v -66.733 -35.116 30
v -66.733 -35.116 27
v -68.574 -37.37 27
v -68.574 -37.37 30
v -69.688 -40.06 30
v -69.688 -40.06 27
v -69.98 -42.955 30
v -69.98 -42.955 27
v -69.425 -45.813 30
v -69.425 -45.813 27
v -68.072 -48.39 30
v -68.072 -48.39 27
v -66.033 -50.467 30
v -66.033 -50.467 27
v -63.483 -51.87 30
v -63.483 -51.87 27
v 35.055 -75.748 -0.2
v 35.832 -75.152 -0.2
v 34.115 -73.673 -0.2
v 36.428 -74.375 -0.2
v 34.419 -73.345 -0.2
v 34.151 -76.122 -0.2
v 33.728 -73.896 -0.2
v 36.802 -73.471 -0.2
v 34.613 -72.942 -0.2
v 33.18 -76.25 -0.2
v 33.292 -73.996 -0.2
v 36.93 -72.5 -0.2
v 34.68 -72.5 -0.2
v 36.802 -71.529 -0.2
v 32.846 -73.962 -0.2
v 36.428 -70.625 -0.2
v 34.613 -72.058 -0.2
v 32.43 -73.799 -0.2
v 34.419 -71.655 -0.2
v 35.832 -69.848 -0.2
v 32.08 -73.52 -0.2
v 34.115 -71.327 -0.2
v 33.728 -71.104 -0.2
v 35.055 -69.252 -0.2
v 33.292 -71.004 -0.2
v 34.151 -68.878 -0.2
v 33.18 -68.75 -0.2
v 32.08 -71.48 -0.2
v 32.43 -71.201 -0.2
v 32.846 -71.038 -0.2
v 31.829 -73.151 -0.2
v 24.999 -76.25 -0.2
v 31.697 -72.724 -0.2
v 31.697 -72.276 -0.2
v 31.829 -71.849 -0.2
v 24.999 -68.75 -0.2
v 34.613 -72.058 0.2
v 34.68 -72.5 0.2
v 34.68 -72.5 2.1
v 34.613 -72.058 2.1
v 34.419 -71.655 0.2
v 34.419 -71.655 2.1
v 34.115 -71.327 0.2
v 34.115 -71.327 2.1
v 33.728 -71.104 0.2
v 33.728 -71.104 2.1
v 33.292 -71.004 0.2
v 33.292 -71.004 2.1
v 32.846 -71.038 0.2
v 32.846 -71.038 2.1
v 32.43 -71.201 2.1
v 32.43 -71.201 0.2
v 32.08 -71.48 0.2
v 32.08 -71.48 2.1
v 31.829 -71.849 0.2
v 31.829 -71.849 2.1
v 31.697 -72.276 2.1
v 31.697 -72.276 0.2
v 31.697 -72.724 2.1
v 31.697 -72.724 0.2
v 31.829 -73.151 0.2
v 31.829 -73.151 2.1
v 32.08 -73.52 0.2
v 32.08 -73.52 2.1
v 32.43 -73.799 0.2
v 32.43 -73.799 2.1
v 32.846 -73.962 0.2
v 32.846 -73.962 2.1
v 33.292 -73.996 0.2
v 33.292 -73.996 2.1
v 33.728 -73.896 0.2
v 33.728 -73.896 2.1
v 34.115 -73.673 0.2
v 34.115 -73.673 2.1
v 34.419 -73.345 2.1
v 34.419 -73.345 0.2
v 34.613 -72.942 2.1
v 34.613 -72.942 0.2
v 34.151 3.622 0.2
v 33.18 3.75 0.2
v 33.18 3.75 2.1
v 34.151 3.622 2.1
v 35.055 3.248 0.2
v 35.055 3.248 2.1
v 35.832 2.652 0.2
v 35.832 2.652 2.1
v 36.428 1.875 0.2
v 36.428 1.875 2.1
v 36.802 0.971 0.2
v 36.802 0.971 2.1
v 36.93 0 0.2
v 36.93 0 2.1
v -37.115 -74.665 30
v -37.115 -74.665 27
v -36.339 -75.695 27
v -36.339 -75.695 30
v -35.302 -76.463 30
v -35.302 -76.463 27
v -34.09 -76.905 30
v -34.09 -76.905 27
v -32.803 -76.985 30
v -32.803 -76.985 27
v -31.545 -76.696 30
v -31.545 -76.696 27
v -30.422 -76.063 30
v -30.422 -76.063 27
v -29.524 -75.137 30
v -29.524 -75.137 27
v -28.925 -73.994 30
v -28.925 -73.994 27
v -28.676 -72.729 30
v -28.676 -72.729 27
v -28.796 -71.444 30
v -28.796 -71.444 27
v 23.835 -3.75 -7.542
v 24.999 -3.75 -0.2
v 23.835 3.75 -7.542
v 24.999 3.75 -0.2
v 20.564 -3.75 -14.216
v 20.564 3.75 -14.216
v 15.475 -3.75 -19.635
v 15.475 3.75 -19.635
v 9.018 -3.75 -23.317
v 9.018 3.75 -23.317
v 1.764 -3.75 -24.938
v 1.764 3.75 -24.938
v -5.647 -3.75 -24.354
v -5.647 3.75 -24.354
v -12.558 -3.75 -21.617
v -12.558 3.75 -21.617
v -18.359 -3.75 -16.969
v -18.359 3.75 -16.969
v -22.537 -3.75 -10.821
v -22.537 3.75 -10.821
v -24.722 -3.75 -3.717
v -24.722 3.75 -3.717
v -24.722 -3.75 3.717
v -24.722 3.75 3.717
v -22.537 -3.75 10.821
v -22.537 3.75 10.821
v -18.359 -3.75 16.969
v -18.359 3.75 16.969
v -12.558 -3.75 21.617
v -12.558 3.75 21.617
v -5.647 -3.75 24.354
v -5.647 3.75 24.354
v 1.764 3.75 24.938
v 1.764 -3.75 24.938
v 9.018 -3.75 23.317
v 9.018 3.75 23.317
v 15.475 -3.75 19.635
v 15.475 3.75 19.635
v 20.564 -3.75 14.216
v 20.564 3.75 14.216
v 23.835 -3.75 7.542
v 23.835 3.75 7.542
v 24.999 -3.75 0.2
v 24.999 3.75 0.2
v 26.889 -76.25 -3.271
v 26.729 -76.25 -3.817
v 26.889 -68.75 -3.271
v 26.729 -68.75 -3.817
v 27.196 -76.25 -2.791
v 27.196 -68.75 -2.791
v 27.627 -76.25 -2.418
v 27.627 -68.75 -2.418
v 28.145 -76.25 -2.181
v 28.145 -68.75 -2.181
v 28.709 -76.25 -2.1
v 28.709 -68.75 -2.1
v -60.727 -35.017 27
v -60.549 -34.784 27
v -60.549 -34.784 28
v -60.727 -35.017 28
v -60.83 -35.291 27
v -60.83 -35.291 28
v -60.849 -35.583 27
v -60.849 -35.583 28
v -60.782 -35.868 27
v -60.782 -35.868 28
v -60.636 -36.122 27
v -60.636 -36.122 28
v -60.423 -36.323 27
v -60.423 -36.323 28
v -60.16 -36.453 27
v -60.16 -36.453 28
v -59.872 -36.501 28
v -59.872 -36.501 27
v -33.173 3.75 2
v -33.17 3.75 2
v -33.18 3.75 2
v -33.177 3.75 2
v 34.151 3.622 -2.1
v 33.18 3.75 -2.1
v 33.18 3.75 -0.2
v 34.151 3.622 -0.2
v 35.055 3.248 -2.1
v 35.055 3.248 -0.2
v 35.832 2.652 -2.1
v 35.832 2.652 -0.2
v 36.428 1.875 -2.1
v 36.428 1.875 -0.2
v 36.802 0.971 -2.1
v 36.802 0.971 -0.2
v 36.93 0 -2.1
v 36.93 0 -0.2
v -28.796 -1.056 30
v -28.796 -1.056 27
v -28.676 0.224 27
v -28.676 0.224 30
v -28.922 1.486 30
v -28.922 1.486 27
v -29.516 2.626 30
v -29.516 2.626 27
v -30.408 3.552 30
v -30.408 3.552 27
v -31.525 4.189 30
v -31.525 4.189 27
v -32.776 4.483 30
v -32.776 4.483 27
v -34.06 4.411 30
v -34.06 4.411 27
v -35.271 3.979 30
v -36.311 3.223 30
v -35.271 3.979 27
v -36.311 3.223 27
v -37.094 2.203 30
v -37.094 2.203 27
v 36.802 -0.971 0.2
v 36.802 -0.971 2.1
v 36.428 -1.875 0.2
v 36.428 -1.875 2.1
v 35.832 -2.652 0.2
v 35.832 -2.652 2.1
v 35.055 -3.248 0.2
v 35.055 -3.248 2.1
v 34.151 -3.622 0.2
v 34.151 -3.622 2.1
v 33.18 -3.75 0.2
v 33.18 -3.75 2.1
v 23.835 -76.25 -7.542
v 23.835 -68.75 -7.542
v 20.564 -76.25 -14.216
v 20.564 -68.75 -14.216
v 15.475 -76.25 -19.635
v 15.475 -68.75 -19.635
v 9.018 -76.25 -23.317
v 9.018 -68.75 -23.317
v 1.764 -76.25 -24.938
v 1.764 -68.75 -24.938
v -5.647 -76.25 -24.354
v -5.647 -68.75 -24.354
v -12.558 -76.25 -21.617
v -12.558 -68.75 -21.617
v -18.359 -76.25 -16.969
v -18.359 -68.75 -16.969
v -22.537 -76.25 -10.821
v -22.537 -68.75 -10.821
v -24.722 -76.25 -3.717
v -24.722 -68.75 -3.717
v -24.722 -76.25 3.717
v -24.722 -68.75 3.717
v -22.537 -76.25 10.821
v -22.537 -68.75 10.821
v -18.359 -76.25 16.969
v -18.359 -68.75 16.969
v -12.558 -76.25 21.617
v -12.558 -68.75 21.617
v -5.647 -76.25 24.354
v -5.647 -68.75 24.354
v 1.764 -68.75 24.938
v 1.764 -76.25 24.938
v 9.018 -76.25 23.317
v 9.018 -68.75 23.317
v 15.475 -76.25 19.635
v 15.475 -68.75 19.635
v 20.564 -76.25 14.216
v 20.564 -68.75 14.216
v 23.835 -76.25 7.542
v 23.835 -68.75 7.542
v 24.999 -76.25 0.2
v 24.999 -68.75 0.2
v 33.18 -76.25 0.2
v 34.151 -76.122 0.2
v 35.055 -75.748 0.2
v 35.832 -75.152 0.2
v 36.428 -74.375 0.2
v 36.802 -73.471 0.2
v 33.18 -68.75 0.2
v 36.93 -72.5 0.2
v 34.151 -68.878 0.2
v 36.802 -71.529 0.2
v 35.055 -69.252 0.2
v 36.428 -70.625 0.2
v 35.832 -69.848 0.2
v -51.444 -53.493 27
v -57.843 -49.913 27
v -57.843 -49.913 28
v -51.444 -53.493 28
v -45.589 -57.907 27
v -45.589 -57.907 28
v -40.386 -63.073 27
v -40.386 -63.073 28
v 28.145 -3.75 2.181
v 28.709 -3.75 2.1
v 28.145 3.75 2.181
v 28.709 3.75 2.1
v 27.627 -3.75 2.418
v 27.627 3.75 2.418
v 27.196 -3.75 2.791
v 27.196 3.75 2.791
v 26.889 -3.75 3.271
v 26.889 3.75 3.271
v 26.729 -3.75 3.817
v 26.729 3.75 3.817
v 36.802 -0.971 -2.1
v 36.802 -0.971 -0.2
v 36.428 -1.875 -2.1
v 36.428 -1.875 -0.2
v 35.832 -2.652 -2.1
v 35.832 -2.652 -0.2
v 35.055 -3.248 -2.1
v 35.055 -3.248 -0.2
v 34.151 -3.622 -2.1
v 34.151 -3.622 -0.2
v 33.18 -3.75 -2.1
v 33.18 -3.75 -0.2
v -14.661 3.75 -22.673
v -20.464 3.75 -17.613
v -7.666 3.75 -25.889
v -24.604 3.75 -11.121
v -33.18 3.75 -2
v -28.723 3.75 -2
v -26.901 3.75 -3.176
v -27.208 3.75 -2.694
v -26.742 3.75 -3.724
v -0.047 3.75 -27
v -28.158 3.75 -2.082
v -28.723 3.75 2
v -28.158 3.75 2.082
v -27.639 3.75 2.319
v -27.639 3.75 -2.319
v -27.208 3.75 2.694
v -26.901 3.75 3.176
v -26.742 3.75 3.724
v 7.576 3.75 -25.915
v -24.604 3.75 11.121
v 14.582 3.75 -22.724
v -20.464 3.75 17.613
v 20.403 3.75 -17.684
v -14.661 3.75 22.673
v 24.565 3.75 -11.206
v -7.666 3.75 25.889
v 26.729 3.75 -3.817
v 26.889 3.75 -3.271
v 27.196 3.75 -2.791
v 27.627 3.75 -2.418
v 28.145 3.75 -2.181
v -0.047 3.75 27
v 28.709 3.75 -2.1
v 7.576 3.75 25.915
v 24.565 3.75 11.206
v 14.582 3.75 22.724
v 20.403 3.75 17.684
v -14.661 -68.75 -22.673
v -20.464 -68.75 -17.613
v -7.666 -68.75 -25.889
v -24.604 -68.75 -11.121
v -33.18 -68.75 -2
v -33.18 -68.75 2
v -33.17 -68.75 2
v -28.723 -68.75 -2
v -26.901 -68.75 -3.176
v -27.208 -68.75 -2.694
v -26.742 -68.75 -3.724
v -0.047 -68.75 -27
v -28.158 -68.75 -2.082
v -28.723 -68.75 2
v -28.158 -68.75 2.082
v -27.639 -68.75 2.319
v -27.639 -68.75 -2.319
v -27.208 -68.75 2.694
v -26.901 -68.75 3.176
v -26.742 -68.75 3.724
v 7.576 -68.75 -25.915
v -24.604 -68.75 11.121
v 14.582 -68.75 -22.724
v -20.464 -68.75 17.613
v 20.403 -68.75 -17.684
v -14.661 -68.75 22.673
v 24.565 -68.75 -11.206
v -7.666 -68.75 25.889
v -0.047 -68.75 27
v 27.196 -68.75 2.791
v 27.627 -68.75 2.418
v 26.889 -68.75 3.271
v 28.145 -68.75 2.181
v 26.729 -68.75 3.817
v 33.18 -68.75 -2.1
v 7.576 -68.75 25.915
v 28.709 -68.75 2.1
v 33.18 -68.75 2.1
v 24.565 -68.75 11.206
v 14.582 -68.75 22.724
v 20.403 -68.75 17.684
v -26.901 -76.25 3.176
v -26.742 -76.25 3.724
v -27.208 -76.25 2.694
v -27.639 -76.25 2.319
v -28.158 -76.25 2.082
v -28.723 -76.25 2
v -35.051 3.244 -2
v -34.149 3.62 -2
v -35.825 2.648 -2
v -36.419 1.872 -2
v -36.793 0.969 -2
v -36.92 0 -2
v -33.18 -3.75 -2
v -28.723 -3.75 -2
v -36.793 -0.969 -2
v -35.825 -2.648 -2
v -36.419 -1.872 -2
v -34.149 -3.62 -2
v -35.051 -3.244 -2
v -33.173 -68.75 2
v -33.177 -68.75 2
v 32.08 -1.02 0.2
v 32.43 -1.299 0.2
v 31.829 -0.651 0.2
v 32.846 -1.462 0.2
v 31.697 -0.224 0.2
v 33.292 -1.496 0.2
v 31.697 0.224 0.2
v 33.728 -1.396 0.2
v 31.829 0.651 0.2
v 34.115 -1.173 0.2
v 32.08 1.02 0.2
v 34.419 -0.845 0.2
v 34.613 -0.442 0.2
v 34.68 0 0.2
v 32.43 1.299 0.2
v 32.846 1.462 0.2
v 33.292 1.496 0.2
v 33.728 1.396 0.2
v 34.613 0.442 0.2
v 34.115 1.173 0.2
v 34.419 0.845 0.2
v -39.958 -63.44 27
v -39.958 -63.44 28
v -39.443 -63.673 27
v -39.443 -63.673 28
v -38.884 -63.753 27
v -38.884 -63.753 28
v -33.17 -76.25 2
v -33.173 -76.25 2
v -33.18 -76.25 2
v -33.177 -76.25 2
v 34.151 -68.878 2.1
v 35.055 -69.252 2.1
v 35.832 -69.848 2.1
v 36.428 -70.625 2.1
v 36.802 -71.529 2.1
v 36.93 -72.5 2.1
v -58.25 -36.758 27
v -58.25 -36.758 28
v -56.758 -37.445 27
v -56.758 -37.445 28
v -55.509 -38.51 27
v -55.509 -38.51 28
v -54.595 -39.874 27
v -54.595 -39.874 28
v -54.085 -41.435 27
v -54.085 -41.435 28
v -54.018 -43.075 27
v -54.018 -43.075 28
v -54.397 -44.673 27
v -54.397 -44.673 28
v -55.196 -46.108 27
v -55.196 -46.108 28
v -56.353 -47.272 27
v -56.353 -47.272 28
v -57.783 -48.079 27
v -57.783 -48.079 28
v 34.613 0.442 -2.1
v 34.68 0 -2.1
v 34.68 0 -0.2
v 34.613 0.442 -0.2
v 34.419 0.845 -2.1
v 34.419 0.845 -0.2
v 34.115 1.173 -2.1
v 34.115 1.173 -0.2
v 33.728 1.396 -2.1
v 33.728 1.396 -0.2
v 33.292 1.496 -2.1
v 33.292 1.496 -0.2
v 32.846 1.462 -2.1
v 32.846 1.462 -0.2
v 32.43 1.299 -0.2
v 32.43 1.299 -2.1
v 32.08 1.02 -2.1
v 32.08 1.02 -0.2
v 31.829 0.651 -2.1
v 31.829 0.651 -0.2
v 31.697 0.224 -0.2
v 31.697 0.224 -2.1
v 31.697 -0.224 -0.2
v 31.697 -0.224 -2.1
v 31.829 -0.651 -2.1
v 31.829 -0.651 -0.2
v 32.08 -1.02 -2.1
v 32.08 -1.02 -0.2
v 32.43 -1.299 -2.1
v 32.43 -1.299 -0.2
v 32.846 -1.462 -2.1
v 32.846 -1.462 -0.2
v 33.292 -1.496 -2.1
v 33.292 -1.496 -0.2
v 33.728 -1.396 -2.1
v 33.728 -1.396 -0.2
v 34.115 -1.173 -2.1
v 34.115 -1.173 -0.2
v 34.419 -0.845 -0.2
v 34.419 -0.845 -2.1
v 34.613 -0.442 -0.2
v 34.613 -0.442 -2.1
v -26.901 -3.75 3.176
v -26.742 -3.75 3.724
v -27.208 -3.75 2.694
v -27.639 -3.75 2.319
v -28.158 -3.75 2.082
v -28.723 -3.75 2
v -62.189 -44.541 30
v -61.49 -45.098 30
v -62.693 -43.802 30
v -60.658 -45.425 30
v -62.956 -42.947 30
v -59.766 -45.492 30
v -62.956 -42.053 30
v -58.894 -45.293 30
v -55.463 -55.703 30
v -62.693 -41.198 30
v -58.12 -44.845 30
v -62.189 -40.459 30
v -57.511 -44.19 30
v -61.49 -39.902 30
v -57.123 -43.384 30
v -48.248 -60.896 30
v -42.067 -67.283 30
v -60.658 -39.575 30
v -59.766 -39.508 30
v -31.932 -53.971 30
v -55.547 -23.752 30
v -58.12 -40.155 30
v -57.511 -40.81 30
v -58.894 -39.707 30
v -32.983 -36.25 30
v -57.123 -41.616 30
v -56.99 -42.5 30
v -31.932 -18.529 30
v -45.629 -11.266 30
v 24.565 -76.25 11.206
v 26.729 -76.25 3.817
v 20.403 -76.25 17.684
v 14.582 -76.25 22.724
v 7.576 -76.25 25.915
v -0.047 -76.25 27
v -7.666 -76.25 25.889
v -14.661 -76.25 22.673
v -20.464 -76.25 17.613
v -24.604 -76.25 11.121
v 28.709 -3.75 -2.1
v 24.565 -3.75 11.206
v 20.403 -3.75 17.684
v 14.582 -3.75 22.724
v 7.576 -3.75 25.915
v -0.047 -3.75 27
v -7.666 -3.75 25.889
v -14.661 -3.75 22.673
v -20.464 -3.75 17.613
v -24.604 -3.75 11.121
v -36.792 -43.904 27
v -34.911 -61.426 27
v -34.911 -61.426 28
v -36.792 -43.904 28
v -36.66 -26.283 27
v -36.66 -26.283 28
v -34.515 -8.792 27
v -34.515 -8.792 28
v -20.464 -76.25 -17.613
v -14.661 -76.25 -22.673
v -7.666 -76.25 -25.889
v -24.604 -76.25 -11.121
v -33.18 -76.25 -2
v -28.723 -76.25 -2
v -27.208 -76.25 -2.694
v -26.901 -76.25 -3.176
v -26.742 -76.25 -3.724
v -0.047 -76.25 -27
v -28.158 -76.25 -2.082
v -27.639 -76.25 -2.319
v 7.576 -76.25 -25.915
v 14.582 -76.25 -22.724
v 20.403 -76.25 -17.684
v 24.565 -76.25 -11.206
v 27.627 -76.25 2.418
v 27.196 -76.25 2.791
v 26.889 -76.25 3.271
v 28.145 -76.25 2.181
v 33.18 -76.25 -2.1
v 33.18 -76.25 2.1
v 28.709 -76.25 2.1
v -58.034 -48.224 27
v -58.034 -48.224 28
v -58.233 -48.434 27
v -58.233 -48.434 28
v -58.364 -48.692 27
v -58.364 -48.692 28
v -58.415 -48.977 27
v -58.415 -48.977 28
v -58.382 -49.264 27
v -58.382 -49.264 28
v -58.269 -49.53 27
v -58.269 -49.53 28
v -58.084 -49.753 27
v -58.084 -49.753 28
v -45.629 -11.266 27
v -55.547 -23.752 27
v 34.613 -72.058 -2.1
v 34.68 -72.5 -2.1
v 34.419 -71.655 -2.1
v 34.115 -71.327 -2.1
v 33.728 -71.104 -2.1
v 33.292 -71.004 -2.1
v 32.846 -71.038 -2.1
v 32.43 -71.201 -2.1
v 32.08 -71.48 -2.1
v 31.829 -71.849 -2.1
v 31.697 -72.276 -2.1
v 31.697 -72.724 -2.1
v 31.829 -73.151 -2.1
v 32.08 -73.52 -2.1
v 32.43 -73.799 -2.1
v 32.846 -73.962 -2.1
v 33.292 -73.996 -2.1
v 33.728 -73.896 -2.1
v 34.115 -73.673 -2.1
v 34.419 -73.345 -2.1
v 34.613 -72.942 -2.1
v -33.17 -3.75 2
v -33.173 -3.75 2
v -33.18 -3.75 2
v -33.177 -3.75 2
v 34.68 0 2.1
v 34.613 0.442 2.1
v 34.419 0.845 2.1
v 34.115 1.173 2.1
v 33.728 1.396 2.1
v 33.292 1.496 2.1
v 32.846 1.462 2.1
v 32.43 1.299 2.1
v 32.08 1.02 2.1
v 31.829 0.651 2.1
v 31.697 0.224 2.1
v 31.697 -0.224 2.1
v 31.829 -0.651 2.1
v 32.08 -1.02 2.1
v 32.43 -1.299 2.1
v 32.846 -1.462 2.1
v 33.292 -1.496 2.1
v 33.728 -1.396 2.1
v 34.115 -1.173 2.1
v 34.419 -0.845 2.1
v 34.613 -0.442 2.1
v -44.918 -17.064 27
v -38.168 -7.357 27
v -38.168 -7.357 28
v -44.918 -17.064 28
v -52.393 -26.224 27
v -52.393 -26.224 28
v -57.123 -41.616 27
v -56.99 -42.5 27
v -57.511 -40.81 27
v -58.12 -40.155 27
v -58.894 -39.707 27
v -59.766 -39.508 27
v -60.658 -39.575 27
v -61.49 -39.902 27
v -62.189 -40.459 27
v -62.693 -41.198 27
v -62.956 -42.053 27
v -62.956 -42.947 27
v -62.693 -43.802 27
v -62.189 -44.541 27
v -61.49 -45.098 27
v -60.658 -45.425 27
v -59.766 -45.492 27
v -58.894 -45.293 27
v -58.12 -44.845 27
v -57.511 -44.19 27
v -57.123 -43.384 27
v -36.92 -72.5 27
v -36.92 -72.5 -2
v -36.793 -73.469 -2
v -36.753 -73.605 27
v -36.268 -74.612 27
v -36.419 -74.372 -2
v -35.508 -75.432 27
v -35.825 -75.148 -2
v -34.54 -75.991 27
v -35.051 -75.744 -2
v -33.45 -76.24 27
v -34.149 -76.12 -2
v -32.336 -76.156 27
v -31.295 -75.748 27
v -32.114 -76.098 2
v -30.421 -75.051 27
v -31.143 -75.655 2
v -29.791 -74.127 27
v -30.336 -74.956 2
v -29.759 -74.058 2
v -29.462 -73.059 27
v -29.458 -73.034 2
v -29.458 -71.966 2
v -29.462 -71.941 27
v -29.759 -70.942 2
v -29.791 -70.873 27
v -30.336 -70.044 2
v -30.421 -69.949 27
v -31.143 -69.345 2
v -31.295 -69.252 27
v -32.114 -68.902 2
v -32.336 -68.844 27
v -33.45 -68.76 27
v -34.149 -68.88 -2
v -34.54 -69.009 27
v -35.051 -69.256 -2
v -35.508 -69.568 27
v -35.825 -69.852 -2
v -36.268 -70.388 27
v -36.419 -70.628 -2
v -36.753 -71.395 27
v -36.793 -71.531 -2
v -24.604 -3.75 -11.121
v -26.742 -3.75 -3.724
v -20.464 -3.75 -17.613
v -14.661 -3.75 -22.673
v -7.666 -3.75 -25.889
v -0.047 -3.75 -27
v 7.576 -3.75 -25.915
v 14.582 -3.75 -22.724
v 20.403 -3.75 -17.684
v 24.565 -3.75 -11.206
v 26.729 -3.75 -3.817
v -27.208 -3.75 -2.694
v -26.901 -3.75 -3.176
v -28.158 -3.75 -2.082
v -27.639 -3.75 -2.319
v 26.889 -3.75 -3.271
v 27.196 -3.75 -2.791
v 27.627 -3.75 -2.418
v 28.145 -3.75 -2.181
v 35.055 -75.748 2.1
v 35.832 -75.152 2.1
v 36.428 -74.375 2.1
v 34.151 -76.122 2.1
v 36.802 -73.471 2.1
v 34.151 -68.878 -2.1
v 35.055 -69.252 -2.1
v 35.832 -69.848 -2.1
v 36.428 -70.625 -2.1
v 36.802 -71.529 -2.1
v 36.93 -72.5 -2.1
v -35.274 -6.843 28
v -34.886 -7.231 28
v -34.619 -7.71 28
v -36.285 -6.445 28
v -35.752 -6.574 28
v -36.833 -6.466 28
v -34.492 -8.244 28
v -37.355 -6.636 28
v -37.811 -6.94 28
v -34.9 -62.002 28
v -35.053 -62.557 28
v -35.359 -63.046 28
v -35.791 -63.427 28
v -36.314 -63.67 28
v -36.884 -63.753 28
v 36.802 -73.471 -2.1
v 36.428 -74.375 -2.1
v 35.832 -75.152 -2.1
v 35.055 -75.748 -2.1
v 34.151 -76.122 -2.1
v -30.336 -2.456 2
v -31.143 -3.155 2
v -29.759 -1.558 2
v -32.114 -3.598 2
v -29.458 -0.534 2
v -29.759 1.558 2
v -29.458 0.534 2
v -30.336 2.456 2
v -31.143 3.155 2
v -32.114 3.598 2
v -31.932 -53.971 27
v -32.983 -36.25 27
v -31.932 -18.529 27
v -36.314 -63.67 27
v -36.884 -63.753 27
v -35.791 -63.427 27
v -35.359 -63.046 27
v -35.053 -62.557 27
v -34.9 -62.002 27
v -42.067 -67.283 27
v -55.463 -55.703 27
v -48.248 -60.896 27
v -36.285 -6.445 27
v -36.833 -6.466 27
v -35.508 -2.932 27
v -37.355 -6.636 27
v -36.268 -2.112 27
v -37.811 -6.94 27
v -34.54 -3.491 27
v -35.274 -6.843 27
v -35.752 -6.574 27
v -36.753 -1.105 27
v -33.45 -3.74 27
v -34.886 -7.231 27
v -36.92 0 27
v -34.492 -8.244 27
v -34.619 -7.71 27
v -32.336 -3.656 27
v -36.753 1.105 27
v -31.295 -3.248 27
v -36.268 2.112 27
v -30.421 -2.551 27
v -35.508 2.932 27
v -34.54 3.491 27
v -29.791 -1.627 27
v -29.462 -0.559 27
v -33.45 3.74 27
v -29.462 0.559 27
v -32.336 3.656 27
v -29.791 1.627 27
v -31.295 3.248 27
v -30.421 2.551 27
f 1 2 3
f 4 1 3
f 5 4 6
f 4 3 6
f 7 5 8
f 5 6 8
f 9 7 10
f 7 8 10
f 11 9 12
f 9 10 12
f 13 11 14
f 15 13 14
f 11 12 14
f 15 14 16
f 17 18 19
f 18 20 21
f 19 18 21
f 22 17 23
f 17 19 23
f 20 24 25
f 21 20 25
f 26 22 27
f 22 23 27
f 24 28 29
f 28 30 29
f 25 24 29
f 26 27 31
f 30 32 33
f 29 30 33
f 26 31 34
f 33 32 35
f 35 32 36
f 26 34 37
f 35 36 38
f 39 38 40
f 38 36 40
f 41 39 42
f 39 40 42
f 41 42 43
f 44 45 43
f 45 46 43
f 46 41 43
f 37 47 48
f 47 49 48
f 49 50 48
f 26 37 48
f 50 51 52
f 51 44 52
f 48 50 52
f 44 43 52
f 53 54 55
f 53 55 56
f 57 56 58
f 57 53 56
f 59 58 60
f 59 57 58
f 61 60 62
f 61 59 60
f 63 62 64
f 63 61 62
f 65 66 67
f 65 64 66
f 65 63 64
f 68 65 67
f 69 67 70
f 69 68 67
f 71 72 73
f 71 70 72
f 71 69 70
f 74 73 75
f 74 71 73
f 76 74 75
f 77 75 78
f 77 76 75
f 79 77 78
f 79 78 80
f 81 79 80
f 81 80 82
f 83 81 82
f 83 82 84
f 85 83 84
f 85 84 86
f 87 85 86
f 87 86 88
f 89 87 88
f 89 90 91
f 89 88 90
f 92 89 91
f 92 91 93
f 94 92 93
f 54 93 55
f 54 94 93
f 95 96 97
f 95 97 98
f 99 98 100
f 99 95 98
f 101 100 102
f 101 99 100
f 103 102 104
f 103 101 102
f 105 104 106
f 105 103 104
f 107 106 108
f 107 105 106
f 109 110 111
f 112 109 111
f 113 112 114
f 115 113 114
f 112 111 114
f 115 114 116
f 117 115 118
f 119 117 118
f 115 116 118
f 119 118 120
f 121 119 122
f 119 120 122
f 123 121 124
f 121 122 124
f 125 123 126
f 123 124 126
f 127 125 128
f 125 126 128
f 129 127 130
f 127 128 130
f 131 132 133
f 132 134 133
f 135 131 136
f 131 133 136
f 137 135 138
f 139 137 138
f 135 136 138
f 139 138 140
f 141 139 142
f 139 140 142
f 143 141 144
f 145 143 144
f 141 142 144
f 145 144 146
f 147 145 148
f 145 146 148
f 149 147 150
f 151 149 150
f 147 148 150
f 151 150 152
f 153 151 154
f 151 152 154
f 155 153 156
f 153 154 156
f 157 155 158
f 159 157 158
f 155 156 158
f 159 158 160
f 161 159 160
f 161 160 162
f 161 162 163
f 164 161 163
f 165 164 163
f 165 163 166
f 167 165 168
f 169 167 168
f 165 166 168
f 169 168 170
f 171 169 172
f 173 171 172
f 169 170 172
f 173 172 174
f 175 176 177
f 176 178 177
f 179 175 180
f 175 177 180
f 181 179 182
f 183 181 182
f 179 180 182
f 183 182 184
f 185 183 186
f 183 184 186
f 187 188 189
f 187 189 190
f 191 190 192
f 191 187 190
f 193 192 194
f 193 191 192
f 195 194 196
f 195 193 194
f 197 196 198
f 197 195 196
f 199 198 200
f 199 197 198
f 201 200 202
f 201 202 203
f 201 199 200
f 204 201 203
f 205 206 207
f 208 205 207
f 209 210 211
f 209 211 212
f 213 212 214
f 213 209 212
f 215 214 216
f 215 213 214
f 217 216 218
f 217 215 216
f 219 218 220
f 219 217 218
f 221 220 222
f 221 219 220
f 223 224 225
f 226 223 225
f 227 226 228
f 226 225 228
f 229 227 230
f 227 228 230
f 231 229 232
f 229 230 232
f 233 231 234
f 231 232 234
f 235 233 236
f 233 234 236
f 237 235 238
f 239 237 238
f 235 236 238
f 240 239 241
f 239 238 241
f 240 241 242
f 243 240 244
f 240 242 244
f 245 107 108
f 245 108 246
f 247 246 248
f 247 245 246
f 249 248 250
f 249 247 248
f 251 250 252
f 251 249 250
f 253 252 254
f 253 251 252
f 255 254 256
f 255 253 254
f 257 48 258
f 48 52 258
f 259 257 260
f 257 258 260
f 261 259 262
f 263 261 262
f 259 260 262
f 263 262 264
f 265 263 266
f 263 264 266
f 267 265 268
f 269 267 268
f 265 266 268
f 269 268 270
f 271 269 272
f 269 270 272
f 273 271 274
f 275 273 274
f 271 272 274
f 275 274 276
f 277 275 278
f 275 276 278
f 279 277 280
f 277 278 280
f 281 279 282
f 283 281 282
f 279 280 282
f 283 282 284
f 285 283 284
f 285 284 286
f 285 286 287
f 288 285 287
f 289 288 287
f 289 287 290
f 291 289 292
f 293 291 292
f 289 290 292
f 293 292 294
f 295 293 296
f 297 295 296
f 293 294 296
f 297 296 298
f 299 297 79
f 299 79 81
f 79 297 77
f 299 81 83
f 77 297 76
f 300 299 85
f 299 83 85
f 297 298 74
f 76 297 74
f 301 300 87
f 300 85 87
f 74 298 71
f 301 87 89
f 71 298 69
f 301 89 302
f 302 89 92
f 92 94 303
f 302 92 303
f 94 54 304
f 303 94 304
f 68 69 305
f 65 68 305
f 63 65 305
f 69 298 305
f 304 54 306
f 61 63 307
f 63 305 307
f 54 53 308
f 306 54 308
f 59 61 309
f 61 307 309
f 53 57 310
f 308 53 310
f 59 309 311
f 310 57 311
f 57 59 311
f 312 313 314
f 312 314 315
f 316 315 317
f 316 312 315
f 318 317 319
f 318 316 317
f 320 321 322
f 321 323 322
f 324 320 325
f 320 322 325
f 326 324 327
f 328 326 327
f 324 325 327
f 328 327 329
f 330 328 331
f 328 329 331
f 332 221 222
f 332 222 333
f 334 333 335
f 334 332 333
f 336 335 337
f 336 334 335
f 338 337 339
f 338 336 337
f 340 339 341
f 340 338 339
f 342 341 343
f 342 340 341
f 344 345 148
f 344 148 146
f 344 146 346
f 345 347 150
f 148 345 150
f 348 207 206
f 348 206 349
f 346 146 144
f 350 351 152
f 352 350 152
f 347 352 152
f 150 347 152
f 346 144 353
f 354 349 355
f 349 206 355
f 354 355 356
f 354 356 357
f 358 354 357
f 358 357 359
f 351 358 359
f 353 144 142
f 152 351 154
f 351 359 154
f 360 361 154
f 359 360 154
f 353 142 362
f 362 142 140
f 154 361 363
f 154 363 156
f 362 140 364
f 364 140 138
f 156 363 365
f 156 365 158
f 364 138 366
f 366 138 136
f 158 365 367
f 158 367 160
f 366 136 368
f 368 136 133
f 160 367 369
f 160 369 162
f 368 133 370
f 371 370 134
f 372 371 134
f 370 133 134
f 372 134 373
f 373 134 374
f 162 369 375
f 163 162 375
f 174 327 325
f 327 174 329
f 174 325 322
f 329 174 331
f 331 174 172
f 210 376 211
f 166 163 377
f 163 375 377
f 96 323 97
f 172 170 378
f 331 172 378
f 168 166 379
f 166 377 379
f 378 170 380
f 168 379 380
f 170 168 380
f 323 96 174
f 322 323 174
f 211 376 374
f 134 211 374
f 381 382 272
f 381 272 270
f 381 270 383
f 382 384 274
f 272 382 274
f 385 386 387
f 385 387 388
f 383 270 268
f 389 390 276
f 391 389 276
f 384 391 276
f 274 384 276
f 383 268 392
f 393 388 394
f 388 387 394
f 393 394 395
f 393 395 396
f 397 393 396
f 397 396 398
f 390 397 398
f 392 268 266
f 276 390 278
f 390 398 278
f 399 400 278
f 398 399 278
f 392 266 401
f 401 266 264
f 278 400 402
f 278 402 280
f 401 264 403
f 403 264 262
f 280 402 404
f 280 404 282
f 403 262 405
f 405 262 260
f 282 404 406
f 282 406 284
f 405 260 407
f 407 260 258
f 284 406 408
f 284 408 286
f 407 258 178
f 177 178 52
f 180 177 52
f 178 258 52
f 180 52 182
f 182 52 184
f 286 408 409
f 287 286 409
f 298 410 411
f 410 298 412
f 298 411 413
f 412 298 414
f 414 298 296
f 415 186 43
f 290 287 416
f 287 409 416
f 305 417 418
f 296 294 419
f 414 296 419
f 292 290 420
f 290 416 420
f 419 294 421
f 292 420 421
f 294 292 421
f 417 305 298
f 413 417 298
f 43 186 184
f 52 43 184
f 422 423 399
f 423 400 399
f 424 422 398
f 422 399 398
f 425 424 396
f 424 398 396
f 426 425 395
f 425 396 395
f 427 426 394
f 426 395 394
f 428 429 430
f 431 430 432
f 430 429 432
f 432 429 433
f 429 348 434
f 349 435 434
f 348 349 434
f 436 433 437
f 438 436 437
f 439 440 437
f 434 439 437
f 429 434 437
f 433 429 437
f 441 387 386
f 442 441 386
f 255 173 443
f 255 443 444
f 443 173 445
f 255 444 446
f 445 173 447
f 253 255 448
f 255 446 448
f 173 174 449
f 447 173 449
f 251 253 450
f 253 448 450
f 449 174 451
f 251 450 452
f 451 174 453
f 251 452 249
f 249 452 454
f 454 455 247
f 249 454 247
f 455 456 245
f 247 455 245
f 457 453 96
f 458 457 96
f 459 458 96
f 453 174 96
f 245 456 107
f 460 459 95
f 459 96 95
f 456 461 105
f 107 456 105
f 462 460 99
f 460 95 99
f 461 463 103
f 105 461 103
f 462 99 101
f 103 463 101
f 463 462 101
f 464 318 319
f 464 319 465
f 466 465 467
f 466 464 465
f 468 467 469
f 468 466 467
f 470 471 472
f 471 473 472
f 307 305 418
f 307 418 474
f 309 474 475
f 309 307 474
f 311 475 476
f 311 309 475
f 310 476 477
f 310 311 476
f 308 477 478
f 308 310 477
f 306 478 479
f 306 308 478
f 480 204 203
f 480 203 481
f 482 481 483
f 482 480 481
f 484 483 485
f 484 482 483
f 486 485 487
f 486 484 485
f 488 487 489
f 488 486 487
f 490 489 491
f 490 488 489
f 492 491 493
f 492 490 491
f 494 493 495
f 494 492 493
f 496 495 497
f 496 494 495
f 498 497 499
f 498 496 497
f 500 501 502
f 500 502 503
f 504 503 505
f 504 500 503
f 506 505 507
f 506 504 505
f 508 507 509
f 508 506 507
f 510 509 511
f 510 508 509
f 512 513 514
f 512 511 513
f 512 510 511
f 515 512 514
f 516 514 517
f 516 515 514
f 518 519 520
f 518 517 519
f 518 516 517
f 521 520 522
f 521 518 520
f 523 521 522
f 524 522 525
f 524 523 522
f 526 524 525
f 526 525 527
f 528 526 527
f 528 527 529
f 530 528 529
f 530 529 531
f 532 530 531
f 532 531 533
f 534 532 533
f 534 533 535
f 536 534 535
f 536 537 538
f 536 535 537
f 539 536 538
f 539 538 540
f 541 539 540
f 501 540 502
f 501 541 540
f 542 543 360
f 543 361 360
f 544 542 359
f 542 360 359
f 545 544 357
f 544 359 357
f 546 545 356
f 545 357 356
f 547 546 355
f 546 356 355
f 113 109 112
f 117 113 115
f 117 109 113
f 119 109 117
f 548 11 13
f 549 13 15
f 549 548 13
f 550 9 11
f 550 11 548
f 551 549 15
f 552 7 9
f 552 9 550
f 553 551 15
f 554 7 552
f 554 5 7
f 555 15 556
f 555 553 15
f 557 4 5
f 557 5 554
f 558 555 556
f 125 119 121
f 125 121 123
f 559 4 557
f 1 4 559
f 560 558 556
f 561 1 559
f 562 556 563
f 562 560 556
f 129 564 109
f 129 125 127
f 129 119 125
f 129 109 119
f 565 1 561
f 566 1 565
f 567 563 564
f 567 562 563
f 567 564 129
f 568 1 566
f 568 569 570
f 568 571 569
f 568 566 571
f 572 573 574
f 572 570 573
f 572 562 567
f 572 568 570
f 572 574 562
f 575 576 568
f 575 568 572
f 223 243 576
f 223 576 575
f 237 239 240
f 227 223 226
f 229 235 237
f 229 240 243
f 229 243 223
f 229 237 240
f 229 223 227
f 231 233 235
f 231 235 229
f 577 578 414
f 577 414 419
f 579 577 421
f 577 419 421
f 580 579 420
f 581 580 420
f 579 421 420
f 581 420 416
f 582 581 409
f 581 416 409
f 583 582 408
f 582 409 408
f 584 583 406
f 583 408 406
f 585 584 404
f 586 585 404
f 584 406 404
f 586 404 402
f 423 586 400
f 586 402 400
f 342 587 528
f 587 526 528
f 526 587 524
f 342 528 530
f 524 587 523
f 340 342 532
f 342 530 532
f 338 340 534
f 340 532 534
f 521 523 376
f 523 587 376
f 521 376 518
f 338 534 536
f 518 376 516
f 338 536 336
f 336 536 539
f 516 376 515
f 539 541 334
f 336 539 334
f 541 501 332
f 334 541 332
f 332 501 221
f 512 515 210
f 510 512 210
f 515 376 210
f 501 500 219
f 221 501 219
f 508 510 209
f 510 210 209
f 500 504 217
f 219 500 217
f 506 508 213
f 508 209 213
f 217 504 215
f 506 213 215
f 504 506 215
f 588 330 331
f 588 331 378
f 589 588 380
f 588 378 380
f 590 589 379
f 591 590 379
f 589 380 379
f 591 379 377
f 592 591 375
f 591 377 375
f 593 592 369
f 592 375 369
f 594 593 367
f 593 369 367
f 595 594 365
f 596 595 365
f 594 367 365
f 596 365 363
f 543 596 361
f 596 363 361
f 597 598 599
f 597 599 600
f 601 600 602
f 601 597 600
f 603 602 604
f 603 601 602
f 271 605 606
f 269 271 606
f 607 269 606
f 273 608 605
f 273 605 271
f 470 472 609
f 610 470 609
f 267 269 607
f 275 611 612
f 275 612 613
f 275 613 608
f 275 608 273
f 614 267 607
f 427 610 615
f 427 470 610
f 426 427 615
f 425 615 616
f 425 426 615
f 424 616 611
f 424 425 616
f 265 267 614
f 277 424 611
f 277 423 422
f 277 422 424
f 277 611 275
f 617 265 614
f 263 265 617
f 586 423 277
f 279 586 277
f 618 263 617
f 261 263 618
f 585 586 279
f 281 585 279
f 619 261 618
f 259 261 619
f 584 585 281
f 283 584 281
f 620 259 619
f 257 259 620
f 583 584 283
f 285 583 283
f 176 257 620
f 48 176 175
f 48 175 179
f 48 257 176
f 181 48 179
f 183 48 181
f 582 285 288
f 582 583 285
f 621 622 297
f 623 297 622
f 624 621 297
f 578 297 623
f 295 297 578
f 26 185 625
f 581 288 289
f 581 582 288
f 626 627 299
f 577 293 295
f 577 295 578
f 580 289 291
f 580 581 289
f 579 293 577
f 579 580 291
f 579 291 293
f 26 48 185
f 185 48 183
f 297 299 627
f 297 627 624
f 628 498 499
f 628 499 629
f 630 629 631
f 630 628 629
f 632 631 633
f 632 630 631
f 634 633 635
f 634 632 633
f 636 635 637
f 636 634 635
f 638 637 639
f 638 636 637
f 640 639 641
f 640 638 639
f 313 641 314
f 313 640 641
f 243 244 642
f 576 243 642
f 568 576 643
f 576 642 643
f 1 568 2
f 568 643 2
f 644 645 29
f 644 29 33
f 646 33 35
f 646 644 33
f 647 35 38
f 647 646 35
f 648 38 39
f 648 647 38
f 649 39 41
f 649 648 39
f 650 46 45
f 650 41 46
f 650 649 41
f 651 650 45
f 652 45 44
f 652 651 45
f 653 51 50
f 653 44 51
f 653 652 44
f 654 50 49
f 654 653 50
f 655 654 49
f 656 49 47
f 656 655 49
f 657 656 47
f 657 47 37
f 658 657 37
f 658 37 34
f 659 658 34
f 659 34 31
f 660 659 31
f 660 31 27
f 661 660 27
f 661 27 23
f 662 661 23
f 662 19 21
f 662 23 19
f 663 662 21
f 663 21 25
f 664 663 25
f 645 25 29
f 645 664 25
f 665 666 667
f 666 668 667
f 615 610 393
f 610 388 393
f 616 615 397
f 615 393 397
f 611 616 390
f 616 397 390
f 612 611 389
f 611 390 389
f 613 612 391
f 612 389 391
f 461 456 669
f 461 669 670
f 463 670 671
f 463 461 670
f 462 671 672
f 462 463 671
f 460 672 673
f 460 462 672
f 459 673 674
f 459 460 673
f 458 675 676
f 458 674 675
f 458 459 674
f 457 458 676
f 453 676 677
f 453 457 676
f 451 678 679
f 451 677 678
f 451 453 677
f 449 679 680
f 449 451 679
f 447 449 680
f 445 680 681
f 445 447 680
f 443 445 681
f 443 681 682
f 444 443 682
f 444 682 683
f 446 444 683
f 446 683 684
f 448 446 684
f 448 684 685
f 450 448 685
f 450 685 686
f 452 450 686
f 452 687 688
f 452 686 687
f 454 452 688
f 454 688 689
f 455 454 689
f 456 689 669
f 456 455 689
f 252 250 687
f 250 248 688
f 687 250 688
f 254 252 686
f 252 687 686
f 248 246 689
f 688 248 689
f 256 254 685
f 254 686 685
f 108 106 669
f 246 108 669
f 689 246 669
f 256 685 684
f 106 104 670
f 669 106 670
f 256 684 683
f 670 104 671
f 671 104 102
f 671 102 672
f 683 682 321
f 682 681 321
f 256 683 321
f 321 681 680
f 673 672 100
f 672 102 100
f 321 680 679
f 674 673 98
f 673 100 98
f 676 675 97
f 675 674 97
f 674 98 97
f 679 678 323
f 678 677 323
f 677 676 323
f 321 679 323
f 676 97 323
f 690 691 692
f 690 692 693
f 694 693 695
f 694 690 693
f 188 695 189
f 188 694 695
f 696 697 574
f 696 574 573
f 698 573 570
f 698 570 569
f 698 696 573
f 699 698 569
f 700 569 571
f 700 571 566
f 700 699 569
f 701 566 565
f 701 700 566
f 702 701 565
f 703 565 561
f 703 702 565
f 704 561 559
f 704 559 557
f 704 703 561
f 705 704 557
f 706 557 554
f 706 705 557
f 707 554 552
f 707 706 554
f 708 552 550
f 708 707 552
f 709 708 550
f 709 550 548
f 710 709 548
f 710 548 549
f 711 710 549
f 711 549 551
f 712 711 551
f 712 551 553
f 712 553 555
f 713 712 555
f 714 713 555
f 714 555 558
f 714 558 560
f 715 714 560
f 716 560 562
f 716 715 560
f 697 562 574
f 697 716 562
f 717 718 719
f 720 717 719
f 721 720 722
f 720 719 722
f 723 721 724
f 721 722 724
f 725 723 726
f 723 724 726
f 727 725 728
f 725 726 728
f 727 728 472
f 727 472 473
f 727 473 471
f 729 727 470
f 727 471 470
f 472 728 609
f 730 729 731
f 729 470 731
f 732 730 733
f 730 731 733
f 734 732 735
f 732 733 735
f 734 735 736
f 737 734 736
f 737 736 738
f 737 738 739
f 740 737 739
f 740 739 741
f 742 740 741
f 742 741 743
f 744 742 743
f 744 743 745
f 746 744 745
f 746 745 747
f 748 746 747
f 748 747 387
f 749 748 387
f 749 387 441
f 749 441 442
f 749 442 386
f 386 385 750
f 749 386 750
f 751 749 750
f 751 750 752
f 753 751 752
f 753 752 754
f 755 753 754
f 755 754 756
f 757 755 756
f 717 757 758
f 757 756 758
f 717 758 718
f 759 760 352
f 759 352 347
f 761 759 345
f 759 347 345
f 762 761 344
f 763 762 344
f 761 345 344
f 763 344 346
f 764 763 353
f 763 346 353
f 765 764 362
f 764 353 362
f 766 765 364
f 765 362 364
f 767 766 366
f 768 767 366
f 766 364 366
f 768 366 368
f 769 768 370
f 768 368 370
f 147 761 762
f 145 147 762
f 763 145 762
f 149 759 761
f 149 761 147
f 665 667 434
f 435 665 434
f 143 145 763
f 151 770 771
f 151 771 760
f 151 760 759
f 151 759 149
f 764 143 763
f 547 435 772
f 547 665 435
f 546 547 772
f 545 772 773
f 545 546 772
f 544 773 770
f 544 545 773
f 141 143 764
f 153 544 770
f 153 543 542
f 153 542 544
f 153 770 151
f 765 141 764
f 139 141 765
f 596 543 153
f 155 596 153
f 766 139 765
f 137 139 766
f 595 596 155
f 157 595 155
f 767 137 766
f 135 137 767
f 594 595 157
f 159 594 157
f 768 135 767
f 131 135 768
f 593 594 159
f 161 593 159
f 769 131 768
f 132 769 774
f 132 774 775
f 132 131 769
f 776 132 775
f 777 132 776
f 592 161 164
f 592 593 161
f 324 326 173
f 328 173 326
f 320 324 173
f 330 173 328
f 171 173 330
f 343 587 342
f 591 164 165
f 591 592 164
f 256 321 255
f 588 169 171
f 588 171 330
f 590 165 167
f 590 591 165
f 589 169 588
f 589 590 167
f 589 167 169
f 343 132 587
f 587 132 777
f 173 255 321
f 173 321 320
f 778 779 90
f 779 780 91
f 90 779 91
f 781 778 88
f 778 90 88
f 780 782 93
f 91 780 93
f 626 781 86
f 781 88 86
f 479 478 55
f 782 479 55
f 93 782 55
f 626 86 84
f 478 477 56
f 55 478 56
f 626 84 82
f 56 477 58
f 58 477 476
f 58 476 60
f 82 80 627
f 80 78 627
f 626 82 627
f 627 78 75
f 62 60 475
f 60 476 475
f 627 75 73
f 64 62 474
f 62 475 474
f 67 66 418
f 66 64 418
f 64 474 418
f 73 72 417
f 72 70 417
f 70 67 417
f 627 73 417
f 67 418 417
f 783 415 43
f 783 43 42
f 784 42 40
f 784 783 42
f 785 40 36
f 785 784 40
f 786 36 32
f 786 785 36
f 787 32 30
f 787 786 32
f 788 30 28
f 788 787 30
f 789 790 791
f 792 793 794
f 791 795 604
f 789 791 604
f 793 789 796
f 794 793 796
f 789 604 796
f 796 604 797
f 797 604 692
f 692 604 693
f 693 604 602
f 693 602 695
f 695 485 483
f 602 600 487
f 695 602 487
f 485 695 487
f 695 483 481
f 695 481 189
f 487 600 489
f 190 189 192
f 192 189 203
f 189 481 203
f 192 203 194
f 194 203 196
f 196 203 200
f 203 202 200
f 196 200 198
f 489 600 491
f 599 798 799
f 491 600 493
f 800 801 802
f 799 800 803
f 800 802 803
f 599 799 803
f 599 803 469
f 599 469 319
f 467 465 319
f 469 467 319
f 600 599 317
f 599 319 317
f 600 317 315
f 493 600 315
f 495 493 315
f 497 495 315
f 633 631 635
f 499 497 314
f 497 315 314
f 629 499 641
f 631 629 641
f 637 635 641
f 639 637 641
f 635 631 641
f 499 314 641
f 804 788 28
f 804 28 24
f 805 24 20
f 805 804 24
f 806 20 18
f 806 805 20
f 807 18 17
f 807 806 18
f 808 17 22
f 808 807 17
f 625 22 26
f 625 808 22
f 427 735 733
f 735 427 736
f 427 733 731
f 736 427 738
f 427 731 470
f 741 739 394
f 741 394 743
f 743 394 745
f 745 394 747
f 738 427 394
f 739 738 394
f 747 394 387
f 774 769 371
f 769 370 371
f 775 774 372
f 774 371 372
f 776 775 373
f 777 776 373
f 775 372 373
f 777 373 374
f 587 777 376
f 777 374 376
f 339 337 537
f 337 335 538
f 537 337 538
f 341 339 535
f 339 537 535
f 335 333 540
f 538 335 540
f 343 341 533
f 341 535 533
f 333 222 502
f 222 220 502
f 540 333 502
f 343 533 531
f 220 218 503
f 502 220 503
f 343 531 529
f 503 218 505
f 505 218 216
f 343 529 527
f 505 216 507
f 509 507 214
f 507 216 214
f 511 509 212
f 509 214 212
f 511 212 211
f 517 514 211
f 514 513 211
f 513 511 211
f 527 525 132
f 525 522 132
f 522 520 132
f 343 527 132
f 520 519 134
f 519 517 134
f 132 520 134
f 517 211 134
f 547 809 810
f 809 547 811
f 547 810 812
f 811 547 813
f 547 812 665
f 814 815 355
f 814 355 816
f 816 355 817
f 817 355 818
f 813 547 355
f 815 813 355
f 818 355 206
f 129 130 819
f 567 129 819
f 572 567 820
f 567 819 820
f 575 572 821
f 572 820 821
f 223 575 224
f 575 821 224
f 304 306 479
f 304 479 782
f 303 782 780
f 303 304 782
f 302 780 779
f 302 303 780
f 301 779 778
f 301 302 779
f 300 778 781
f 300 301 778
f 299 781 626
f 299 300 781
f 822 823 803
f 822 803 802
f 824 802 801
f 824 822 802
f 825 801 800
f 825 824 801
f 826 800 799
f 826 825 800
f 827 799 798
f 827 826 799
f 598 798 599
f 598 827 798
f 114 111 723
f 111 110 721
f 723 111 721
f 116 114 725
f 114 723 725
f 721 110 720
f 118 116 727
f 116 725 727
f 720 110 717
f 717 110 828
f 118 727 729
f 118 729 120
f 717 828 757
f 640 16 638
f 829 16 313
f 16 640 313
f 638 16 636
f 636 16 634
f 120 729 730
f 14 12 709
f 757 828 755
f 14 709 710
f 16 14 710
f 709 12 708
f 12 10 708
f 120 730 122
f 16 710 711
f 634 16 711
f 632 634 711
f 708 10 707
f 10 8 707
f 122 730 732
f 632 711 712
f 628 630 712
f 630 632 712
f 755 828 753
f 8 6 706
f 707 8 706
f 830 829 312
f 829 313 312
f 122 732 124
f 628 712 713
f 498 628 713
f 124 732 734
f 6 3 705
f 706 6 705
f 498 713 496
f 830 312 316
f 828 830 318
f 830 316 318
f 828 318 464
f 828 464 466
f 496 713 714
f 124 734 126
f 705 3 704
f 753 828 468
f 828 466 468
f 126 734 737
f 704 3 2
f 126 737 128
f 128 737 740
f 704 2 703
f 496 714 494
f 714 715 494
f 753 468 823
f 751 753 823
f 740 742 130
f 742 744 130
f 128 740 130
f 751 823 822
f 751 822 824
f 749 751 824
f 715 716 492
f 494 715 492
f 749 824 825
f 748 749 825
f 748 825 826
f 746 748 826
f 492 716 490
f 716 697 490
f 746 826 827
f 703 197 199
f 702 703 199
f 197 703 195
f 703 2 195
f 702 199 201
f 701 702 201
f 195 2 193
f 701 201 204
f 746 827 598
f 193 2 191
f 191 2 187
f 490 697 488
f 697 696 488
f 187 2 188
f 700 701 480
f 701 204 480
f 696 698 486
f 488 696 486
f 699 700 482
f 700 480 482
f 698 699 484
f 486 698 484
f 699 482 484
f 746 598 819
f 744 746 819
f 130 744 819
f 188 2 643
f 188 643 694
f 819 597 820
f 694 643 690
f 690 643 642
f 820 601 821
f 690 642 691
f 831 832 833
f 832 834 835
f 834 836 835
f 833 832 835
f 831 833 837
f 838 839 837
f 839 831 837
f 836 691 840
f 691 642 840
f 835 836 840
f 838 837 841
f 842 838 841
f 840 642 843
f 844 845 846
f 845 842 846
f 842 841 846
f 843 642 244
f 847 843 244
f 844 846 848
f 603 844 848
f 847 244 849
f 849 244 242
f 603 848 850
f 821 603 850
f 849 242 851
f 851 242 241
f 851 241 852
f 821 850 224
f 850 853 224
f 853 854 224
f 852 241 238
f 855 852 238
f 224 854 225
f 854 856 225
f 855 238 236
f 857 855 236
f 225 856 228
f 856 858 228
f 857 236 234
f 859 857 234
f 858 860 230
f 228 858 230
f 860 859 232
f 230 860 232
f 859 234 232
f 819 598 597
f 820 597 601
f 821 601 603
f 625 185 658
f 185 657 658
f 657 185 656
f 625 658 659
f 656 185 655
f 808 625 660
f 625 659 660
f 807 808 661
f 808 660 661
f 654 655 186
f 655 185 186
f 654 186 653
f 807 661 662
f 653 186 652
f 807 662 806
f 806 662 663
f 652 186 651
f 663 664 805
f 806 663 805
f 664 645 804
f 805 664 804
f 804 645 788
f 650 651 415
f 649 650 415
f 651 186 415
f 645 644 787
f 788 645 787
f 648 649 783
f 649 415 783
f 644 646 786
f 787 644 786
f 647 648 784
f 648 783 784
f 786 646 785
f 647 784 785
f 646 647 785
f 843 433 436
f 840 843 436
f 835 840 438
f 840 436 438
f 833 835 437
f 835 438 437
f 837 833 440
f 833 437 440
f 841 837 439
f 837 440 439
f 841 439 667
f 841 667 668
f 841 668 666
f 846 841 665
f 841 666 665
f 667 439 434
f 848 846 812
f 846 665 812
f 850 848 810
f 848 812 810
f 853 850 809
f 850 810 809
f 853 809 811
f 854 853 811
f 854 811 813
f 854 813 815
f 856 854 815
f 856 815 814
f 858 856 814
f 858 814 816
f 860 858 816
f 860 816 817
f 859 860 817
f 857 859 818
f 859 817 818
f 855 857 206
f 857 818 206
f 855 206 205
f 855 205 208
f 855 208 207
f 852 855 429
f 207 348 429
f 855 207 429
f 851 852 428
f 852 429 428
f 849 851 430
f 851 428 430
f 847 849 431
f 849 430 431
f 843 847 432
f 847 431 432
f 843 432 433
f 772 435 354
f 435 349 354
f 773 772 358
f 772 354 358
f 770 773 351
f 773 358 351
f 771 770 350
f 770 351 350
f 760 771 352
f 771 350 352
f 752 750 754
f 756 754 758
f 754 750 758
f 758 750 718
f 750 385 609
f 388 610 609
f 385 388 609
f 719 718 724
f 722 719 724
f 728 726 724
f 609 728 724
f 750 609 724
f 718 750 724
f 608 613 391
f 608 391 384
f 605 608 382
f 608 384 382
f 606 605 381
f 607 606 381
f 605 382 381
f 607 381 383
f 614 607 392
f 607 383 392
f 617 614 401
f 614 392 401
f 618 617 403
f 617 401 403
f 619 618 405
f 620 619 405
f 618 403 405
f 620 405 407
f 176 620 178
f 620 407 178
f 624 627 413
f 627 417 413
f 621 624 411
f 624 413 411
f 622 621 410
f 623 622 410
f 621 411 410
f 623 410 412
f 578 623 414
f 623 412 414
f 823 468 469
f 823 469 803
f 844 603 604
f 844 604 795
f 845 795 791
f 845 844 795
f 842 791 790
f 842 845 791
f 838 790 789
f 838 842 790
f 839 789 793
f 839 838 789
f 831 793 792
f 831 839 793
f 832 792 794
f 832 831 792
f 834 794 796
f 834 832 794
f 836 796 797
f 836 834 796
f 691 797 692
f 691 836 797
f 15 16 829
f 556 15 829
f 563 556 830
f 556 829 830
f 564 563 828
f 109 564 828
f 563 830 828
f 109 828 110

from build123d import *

# Parameters (mm, degrees)
BOSS_EXTRUDE1_DEPTH     = 3.75
CUT_EXTRUDE1_DEPTH      = 48.166697998
CUT_EXTRUDE1_DEPTH_BACK = 48.166697998
SKETCH2_R               = 1.5
BOSS_EXTRUDE2_START     = -4
SKETCH3_R               = 3.75
BOSS_EXTRUDE2_DEPTH     = 29
SKETCH4_R               = 3
SKETCH4_R_2             = 3.75
BOSS_EXTRUDE3_DEPTH     = 3
CUT_EXTRUDE2_DEPTH      = 1


with BuildPart() as part:
    # Sketch1 → Boss-Extrude1 (new, symmetric)
    with BuildSketch(Plane(origin=(0, 0, 0), x_dir=(-1, 0, 0), z_dir=(0, 1, 0))):
        with BuildLine():
            Line((-36.93, 2.1), (-28.70870948, 2.1))
            ThreePointArc((-28.70870948, 2.1), (-27.398273911, 2.589119918), (-26.728798481, 3.817241379))
            ThreePointArc((-26.728798481, 3.817241379), (0.047012438, 26.999959071), (26.741929561, 3.724137931))
            ThreePointArc((26.741929561, 3.724137931), (27.409748904, 2.491403941), (28.722813233, 2))
            Line((28.722813233, 2), (33.18, 2))
            Line((33.18, 2), (33.18, -2))
            Line((33.18, -2), (28.722813233, -2))
            ThreePointArc((28.722813233, -2), (27.409748904, -2.491403941), (26.741929561, -3.724137931))
            ThreePointArc((26.741929561, -3.724137931), (0.047012438, -26.999959071), (-26.728798481, -3.817241379))
            ThreePointArc((-26.728798481, -3.817241379), (-27.398273911, -2.589119918), (-28.70870948, -2.1))
            Line((-28.70870948, -2.1), (-36.93, -2.1))
            Line((-36.93, -2.1), (-36.93, -0.2))
            Line((-36.93, -0.2), (-24.999199987, -0.2))
            ThreePointArc((-24.999199987, -0.2), (25, 0), (-24.999199987, 0.2))
            Line((-24.999199987, 0.2), (-36.93, 0.2))
            Line((-36.93, 0.2), (-36.93, 2.1))
        make_face()
    extrude(amount=BOSS_EXTRUDE1_DEPTH, both=True)

    # Sketch2 → Cut-Extrude1 (cut, two sides: drawn at the far end of the back side and taken through both)
    with BuildSketch(Plane.XY.offset(2.1).offset(-CUT_EXTRUDE1_DEPTH_BACK)):
        with BuildLine():
            Line((36.93, 0), (36.93, 3.75))
            Line((36.93, 3.75), (33.18, 3.75))
            ThreePointArc((33.18, 3.75), (35.831650429, 2.651650429), (36.93, 0))
        make_face()
        with BuildLine():
            Line((36.93, -3.75), (36.93, 0))
            ThreePointArc((36.93, 0), (35.831650429, -2.651650429), (33.18, -3.75))
            Line((33.18, -3.75), (36.93, -3.75))
        make_face()
        with Locations((33.18, 0)):
            Circle(SKETCH2_R)
    extrude(amount=CUT_EXTRUDE1_DEPTH + CUT_EXTRUDE1_DEPTH_BACK, mode=Mode.SUBTRACT)

    # Sketch3 → Boss-Extrude2 (add)
    with BuildSketch(Plane.XY.offset(2).offset(BOSS_EXTRUDE2_START)):
        with Locations(Location((-33.17, 0, 0), (0, 0, 180))):
            Circle(SKETCH3_R)
    extrude(amount=BOSS_EXTRUDE2_DEPTH)


with BuildPart() as body_2:
    # Body-Move/Copy1: copy of part
    add(part.part.moved(Location((0, -72.5, 0))))


with BuildPart() as part_1:
    add(part.part)

    add(body_2.part)  # Boss-Extrude3 merges body 2
    # Sketch4 → Boss-Extrude3 (add)
    # profile 1 of 2: a face of its own
    with BuildSketch(Plane.XY.offset(27)):
        with BuildLine():
            ThreePointArc((-63.482977809, -51.870117717), (-48.248375933, -60.895538839), (-37.114961483, -74.665012447))
            ThreePointArc((-37.114961483, -74.665012447), (-31.545330888, -76.696480701), (-28.795616265, -71.444174757))
            ThreePointArc((-28.795616265, -71.444174757), (-32.982825115, -36.25), (-28.795616265, -1.055825243))
            ThreePointArc((-28.795616265, -1.055825243), (-31.524893516, 4.188511031), (-37.09366658, 2.203370275))
            ThreePointArc((-37.09366658, 2.203370275), (-50.421900488, -17.640799048), (-66.733284536, -35.115684618))
            ThreePointArc((-66.733284536, -35.115684618), (-69.806976307, -44.404462177), (-63.482977809, -51.870117717))
        make_face()
        with Locations((-59.99, -42.5)):
            Circle(SKETCH4_R, mode=Mode.SUBTRACT)
        with Locations(Location((-33.17, -72.5, 0), (0, 0, 180))):
            Circle(SKETCH4_R_2, mode=Mode.SUBTRACT)
    # profile 2 of 2: a face of its own
    with BuildSketch(Plane.XY.offset(27)):
        with Locations(Location((-33.17, -72.5, 0), (0, 0, 180))):
            Circle(SKETCH4_R_2)
    extrude(amount=BOSS_EXTRUDE3_DEPTH)

    # Sketch5 → Cut-Extrude2 (cut)
    with BuildSketch(Plane(origin=(0, 0, 27), x_dir=(1, 0, 0), z_dir=(0, 0, -1))):
        with BuildLine():
            Line((-38.884156213, 63.752554506), (-36.884156213, 63.752554506))
            ThreePointArc((-36.884156213, 63.752554506), (-35.358719938, 63.046016594), (-34.911062224, 61.425598679))
            ThreePointArc((-34.911062224, 61.425598679), (-36.978469514, 35.091765908), (-34.515193771, 8.792009371))
            ThreePointArc((-34.515193771, 8.792009371), (-35.751988173, 6.573851631), (-38.16775438, 7.357406215))
            ThreePointArc((-38.16775438, 7.357406215), (-48.567697695, 21.716067782), (-60.549030633, 34.784259851))
            ThreePointArc((-60.549030633, 34.784259851), (-60.782300133, 35.868309862), (-59.871765467, 36.501165064))
            ThreePointArc((-59.871765467, 36.501165064), (-54.085301002, 41.434856938), (-57.783175082, 48.079419663))
            ThreePointArc((-57.783175082, 48.079419663), (-58.414835004, 48.976588199), (-57.843234491, 49.913166275))
            ThreePointArc((-57.843234491, 49.913166275), (-48.441923829, 55.600366923), (-40.386431593, 63.072845642))
            ThreePointArc((-40.386431593, 63.072845642), (-39.708600792, 63.574721111), (-38.884156213, 63.752554506))
        make_face()
    extrude(amount=-CUT_EXTRUDE2_DEPTH, mode=Mode.SUBTRACT)


solid = part_1.part
